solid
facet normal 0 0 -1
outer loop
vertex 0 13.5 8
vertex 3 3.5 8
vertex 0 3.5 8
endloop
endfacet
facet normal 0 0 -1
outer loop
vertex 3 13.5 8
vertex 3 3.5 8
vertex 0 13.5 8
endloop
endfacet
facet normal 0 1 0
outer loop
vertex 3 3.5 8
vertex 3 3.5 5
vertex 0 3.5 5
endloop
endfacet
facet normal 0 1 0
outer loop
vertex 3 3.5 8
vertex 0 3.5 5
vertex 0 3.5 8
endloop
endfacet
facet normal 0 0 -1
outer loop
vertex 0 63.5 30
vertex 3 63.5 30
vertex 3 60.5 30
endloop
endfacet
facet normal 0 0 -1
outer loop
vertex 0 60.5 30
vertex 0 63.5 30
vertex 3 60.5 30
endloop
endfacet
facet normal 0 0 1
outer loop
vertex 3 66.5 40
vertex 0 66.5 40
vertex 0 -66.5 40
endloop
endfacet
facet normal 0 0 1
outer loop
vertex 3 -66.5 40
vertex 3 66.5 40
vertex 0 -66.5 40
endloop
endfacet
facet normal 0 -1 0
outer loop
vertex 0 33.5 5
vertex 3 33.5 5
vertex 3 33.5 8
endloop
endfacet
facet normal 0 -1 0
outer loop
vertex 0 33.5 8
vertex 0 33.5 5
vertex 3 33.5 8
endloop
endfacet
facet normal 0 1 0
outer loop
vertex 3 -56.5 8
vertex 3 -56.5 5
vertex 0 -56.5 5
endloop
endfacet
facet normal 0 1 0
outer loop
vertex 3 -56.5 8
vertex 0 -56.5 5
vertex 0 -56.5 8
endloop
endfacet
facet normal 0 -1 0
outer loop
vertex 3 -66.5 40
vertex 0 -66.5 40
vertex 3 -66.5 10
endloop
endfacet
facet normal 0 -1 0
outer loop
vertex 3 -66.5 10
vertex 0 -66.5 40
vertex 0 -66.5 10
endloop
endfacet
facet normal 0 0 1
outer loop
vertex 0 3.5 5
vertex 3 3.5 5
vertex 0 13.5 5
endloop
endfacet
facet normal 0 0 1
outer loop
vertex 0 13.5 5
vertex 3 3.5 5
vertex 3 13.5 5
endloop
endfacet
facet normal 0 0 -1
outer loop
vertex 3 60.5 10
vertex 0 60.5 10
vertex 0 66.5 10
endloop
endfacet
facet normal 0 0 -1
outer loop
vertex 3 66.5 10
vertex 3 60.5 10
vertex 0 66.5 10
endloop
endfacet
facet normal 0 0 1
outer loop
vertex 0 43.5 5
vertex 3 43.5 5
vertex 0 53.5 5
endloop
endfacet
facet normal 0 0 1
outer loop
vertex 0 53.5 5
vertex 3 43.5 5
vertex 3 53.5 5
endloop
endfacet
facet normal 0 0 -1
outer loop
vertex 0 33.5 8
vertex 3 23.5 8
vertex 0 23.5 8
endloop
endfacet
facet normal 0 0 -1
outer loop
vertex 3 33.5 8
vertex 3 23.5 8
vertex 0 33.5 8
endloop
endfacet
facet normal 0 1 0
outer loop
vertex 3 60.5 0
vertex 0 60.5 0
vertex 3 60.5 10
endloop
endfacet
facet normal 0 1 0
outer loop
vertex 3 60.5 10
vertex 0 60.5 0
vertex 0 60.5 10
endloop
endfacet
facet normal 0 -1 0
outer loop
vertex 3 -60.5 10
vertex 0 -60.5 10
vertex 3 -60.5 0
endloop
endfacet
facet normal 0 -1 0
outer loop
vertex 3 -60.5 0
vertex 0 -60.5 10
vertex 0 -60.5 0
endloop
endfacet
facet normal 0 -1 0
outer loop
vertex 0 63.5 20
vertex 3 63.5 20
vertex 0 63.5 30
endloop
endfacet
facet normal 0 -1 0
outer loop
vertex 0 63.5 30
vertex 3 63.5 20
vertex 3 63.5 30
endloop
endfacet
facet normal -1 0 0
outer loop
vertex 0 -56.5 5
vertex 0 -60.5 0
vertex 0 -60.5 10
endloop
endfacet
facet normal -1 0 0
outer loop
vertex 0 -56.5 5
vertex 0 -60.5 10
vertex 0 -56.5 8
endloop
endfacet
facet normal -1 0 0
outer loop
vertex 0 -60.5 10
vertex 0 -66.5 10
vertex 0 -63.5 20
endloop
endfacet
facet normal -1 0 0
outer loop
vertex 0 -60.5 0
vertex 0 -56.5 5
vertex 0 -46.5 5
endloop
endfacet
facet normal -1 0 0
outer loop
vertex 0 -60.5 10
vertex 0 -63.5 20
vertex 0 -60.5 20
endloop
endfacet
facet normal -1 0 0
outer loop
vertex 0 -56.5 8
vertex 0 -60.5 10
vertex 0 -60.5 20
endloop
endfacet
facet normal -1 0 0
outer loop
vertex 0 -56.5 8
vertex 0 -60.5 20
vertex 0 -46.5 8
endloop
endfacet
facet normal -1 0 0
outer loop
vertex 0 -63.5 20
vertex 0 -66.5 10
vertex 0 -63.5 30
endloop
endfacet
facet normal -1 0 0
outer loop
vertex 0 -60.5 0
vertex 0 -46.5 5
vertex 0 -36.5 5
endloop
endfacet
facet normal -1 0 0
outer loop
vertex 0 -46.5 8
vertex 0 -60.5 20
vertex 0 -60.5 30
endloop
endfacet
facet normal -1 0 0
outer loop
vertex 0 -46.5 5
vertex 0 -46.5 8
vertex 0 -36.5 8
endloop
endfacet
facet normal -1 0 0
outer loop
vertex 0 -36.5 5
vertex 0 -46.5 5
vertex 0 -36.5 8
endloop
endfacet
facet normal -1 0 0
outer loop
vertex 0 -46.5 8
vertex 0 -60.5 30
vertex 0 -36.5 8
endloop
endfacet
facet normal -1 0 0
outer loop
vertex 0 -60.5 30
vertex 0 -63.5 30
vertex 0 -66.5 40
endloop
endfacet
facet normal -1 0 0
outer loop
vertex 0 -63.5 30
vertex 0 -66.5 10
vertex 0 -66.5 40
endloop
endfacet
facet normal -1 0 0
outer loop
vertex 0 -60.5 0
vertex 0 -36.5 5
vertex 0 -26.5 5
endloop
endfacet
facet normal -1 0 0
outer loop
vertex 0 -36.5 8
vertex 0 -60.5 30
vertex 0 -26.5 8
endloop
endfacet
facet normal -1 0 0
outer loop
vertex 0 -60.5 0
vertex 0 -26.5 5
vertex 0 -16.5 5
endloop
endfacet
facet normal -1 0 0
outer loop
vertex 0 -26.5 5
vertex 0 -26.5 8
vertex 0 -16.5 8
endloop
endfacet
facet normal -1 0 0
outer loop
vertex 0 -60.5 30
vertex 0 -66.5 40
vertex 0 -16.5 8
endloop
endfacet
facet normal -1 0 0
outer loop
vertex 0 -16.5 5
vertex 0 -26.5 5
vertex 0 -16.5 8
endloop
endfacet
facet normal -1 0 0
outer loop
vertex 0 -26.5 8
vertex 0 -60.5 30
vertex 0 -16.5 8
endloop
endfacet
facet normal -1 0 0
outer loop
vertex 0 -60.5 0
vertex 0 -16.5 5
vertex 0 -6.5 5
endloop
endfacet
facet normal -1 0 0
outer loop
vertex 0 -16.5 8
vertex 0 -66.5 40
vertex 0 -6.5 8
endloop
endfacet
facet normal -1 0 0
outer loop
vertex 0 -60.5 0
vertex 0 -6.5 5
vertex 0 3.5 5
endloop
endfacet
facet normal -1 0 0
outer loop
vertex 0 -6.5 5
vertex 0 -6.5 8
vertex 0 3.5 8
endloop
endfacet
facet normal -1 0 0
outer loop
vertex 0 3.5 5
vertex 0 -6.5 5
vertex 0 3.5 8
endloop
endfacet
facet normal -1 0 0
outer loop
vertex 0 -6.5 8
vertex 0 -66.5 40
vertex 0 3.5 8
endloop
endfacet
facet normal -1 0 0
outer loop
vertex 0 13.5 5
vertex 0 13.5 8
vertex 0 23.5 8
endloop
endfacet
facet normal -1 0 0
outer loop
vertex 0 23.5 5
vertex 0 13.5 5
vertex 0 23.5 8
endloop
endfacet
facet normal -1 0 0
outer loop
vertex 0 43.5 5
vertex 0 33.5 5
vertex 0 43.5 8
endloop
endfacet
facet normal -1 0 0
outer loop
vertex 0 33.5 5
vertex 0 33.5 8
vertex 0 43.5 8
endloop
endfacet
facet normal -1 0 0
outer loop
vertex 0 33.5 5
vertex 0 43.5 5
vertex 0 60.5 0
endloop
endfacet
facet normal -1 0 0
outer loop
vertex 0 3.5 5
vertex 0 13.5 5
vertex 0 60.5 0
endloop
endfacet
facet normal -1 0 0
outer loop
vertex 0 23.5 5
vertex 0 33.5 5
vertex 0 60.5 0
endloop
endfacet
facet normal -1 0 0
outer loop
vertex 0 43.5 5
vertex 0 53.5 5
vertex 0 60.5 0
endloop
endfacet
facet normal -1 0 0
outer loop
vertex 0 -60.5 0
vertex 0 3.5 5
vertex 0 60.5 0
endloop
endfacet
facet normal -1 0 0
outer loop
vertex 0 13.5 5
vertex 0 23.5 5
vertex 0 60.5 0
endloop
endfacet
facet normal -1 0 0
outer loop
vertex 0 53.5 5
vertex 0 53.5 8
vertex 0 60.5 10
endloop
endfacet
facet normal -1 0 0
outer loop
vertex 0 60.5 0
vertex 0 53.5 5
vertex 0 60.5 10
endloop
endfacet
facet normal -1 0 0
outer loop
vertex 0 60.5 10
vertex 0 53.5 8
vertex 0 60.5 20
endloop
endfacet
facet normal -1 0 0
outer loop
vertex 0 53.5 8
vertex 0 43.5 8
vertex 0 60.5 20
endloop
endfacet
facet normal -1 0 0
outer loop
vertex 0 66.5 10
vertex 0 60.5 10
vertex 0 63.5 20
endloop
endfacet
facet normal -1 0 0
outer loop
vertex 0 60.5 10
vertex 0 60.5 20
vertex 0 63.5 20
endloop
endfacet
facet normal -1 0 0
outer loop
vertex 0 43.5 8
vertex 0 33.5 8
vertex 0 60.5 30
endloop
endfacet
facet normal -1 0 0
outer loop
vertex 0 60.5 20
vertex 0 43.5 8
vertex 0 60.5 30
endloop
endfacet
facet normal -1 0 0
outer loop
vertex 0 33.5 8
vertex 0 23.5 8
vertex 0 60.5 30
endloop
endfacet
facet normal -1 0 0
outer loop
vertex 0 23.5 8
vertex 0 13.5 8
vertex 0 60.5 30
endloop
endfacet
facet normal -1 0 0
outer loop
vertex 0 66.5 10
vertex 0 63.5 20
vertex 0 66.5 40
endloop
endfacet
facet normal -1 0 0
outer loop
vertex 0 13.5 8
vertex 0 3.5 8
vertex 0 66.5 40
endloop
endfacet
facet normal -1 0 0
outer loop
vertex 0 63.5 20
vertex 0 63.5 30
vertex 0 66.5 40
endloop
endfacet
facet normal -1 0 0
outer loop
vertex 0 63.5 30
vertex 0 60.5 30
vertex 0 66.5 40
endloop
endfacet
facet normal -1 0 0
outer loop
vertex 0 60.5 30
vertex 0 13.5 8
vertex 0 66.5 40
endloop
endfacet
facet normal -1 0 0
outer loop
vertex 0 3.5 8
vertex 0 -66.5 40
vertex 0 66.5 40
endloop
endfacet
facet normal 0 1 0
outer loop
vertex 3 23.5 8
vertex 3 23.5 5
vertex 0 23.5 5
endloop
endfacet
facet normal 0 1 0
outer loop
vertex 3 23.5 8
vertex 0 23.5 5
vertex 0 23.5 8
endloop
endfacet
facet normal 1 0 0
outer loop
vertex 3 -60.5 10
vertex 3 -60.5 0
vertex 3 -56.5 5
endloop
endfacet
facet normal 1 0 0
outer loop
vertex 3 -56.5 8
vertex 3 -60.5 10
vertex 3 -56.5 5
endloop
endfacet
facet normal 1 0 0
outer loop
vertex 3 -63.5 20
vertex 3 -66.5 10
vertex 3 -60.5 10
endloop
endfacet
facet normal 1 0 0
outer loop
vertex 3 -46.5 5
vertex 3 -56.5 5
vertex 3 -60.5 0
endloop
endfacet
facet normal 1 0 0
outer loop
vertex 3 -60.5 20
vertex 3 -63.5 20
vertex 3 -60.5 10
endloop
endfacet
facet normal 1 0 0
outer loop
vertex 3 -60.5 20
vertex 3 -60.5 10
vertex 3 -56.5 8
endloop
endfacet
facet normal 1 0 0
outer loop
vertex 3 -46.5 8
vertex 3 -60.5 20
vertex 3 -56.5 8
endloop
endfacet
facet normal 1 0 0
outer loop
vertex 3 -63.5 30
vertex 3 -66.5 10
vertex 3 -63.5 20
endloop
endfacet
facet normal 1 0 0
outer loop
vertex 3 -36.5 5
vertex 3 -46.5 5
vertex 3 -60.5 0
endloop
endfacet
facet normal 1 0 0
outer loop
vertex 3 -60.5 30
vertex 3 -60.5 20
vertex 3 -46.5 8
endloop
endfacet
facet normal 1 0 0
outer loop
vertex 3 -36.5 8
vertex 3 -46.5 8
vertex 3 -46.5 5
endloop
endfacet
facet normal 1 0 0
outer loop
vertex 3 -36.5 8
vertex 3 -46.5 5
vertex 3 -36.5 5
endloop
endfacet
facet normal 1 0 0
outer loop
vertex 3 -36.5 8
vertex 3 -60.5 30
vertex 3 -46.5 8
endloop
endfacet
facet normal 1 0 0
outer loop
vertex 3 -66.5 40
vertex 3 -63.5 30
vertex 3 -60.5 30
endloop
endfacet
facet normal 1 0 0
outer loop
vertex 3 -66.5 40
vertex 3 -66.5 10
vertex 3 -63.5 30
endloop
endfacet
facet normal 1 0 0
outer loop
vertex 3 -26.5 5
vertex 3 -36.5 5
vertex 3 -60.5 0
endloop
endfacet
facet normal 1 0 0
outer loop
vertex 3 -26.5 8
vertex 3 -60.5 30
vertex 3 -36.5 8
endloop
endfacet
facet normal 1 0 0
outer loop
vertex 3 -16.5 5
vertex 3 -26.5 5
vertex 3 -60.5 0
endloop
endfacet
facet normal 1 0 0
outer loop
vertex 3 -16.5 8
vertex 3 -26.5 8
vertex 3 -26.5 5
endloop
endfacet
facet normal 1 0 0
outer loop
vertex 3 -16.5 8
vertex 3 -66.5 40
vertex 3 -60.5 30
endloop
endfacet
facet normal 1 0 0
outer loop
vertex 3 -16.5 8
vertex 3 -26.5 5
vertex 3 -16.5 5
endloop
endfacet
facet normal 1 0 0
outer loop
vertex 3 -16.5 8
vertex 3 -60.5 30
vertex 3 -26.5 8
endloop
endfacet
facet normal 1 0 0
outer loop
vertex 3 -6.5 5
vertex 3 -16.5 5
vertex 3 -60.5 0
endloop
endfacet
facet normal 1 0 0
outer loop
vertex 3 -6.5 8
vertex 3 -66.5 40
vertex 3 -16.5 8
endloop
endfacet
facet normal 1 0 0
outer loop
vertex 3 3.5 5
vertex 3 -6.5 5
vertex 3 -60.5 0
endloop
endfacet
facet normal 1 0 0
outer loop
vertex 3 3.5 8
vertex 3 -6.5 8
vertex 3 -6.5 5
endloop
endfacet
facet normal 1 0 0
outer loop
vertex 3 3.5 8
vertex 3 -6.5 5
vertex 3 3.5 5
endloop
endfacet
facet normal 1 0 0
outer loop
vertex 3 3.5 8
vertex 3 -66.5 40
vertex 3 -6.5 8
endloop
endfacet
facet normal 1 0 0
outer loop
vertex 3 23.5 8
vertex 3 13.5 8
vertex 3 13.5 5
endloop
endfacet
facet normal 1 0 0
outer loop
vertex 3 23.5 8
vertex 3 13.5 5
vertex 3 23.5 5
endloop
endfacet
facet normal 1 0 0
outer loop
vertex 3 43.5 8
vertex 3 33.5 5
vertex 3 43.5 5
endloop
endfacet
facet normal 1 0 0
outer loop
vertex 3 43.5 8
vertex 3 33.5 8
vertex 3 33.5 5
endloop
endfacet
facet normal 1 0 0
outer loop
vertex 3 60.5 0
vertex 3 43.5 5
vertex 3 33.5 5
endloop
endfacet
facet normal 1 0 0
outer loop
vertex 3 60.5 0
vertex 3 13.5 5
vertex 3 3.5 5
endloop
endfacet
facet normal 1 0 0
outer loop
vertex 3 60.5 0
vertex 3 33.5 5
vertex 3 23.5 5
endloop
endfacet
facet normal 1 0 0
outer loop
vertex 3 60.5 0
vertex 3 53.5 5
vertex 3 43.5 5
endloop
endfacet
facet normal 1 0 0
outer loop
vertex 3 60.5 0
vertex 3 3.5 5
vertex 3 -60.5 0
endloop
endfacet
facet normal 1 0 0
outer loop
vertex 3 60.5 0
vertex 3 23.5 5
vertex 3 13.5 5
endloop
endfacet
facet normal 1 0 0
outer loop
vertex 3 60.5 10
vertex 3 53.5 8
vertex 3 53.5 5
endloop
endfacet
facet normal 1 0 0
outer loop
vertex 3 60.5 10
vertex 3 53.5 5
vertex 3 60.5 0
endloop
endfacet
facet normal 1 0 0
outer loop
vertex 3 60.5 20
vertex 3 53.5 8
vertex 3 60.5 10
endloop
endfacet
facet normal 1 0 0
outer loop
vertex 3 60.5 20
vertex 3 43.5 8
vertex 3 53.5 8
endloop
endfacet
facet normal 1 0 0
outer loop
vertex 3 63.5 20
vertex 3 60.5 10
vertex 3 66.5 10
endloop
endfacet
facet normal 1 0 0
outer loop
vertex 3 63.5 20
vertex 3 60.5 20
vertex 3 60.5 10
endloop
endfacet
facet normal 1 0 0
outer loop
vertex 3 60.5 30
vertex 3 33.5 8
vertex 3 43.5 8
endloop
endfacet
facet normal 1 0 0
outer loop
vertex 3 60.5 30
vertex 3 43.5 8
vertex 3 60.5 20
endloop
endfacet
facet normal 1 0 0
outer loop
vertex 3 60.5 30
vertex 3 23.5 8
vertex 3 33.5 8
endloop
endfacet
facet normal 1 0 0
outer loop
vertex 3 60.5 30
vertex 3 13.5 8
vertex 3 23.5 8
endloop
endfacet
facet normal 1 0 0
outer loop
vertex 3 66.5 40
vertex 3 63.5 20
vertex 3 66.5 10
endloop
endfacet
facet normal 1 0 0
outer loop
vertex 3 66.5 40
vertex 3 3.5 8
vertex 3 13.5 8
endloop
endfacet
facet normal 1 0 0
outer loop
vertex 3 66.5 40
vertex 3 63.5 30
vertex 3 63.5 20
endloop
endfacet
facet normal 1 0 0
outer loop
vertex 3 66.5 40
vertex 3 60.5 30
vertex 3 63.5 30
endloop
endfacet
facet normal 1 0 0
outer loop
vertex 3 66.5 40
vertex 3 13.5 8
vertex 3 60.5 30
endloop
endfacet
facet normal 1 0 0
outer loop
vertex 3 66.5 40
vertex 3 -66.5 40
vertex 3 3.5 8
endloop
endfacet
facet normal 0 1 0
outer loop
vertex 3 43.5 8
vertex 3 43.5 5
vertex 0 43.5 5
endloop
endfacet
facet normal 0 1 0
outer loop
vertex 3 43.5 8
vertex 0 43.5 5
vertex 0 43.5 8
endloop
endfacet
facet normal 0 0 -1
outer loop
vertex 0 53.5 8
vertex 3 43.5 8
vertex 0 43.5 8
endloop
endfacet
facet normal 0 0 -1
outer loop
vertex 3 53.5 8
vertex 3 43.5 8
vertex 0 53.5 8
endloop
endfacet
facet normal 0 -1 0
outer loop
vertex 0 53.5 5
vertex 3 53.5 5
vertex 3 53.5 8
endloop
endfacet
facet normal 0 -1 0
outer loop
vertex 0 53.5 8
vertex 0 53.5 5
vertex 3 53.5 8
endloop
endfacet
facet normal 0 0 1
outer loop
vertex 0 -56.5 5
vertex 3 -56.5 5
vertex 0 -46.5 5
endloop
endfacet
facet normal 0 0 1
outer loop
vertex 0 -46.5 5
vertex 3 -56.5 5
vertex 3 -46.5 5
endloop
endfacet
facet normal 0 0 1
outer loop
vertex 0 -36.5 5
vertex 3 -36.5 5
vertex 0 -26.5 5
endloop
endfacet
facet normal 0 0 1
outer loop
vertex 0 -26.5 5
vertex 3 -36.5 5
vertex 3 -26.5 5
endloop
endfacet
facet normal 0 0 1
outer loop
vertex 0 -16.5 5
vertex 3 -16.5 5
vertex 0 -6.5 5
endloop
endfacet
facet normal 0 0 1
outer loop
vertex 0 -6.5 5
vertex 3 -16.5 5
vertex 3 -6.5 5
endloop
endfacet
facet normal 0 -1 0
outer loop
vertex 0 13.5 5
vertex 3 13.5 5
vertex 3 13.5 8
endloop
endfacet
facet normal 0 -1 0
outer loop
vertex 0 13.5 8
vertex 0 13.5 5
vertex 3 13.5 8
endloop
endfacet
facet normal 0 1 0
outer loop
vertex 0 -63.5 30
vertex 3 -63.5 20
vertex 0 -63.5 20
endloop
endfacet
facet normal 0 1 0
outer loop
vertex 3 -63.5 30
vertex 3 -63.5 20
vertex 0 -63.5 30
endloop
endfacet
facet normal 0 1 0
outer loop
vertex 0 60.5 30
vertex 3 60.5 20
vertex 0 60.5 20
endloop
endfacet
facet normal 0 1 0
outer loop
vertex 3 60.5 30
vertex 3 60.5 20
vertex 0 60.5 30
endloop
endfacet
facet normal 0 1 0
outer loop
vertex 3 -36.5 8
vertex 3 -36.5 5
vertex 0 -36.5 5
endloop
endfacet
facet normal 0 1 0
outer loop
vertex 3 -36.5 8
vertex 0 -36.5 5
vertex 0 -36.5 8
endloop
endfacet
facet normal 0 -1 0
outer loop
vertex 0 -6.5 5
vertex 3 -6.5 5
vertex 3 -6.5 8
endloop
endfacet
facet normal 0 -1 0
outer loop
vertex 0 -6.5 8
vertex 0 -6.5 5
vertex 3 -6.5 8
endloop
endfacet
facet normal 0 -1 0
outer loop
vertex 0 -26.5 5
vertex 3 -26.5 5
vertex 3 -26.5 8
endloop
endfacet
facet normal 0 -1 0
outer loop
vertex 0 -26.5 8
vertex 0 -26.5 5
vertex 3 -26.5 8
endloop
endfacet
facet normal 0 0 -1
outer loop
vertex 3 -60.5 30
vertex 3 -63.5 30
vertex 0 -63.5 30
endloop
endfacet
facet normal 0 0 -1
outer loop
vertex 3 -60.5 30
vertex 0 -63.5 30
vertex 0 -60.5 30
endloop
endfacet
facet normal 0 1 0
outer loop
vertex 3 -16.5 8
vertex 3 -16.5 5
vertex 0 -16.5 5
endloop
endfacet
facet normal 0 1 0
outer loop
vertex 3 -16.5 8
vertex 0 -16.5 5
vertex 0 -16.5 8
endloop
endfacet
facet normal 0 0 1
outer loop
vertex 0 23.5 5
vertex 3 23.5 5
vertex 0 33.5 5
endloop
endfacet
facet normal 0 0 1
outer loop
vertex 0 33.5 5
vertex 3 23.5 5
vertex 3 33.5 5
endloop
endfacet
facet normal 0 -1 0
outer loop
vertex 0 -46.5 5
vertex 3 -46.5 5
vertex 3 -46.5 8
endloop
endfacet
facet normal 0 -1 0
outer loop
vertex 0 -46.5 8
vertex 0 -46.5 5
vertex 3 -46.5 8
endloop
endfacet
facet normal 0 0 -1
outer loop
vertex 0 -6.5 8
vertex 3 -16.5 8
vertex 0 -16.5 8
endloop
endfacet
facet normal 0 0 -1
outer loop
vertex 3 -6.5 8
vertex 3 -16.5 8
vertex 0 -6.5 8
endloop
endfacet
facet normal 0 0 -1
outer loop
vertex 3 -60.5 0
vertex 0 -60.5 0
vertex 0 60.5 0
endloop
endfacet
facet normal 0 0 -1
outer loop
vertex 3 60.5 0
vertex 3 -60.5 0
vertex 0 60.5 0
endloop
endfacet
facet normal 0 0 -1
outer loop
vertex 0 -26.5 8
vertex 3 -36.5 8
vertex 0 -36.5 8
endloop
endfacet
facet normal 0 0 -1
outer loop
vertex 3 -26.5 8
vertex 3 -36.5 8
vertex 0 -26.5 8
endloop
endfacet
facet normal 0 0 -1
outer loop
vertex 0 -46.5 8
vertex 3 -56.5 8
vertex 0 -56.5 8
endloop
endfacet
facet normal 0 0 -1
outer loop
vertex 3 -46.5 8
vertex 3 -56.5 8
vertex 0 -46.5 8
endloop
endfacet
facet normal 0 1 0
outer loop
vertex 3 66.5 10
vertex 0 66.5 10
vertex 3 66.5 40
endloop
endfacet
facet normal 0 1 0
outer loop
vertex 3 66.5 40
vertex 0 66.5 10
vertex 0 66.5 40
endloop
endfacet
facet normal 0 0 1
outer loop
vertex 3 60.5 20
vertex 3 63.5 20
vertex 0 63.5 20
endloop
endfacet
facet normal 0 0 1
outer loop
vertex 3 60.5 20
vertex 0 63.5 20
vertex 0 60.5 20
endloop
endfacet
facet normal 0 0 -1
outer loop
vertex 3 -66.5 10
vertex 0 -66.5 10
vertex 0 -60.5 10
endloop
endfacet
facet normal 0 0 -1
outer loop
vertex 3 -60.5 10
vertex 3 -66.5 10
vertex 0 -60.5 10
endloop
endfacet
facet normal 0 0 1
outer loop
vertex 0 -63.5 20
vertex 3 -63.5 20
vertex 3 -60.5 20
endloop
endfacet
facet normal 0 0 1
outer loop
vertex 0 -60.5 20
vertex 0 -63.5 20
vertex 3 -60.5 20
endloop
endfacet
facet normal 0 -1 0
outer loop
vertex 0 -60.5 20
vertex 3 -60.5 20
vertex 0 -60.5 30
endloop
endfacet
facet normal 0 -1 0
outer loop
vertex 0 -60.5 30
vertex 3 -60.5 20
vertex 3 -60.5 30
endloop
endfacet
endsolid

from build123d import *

# Parameters (mm, degrees)
PAD_DEPTH       = 3
SKETCH001_W     = 10
SKETCH001_H     = 3
POCKET_DEPTH    = 3.001
SKETCH002_W     = 3
SKETCH002_H     = 10
POCKET001_DEPTH = 280.835483


with BuildPart() as part:
    # Sketch → Pad (new body)
    with BuildSketch(Plane.YZ):
        Polygon((-60.5, 0), (60.5, 0), (60.5, 10), (66.5, 10), (66.5, 40), (-66.5, 40), (-66.5, 10), (-60.5, 10), align=None)
    extrude(amount=PAD_DEPTH)

    # Sketch001 (on Face10 of Pad) → Pocket (cut, through all)
    with BuildSketch(Plane.YZ.offset(3)):
        with Locations((-51.5, 6.5)):
            Rectangle(SKETCH001_W, SKETCH001_H)
        with Locations((-31.5, 6.5)):
            Rectangle(SKETCH001_W, SKETCH001_H)
        with Locations((-11.5, 6.5)):
            Rectangle(SKETCH001_W, SKETCH001_H)
        with Locations((8.5, 6.5)):
            Rectangle(SKETCH001_W, SKETCH001_H)
        with Locations((28.5, 6.5)):
            Rectangle(SKETCH001_W, SKETCH001_H)
        with Locations((48.5, 6.5)):
            Rectangle(SKETCH001_W, SKETCH001_H)
    extrude(amount=-POCKET_DEPTH, mode=Mode.SUBTRACT)

    # Sketch002 (on Face5 of Pocket) → Pocket001 (cut, through all)
    with BuildSketch(Plane.YZ.offset(3)):
        with Locations((-62, 25)):
            Rectangle(SKETCH002_W, SKETCH002_H)
    pocket001 = extrude(amount=-POCKET001_DEPTH, mode=Mode.SUBTRACT)

    # Mirrored: Pocket001 across Sketch002 V_Axis
    add(pocket001.mirror(Plane(origin=(3, 0, 0), x_dir=(1, 0, 0), z_dir=(0, 1, 0))), mode=Mode.SUBTRACT)


solid = part.part
